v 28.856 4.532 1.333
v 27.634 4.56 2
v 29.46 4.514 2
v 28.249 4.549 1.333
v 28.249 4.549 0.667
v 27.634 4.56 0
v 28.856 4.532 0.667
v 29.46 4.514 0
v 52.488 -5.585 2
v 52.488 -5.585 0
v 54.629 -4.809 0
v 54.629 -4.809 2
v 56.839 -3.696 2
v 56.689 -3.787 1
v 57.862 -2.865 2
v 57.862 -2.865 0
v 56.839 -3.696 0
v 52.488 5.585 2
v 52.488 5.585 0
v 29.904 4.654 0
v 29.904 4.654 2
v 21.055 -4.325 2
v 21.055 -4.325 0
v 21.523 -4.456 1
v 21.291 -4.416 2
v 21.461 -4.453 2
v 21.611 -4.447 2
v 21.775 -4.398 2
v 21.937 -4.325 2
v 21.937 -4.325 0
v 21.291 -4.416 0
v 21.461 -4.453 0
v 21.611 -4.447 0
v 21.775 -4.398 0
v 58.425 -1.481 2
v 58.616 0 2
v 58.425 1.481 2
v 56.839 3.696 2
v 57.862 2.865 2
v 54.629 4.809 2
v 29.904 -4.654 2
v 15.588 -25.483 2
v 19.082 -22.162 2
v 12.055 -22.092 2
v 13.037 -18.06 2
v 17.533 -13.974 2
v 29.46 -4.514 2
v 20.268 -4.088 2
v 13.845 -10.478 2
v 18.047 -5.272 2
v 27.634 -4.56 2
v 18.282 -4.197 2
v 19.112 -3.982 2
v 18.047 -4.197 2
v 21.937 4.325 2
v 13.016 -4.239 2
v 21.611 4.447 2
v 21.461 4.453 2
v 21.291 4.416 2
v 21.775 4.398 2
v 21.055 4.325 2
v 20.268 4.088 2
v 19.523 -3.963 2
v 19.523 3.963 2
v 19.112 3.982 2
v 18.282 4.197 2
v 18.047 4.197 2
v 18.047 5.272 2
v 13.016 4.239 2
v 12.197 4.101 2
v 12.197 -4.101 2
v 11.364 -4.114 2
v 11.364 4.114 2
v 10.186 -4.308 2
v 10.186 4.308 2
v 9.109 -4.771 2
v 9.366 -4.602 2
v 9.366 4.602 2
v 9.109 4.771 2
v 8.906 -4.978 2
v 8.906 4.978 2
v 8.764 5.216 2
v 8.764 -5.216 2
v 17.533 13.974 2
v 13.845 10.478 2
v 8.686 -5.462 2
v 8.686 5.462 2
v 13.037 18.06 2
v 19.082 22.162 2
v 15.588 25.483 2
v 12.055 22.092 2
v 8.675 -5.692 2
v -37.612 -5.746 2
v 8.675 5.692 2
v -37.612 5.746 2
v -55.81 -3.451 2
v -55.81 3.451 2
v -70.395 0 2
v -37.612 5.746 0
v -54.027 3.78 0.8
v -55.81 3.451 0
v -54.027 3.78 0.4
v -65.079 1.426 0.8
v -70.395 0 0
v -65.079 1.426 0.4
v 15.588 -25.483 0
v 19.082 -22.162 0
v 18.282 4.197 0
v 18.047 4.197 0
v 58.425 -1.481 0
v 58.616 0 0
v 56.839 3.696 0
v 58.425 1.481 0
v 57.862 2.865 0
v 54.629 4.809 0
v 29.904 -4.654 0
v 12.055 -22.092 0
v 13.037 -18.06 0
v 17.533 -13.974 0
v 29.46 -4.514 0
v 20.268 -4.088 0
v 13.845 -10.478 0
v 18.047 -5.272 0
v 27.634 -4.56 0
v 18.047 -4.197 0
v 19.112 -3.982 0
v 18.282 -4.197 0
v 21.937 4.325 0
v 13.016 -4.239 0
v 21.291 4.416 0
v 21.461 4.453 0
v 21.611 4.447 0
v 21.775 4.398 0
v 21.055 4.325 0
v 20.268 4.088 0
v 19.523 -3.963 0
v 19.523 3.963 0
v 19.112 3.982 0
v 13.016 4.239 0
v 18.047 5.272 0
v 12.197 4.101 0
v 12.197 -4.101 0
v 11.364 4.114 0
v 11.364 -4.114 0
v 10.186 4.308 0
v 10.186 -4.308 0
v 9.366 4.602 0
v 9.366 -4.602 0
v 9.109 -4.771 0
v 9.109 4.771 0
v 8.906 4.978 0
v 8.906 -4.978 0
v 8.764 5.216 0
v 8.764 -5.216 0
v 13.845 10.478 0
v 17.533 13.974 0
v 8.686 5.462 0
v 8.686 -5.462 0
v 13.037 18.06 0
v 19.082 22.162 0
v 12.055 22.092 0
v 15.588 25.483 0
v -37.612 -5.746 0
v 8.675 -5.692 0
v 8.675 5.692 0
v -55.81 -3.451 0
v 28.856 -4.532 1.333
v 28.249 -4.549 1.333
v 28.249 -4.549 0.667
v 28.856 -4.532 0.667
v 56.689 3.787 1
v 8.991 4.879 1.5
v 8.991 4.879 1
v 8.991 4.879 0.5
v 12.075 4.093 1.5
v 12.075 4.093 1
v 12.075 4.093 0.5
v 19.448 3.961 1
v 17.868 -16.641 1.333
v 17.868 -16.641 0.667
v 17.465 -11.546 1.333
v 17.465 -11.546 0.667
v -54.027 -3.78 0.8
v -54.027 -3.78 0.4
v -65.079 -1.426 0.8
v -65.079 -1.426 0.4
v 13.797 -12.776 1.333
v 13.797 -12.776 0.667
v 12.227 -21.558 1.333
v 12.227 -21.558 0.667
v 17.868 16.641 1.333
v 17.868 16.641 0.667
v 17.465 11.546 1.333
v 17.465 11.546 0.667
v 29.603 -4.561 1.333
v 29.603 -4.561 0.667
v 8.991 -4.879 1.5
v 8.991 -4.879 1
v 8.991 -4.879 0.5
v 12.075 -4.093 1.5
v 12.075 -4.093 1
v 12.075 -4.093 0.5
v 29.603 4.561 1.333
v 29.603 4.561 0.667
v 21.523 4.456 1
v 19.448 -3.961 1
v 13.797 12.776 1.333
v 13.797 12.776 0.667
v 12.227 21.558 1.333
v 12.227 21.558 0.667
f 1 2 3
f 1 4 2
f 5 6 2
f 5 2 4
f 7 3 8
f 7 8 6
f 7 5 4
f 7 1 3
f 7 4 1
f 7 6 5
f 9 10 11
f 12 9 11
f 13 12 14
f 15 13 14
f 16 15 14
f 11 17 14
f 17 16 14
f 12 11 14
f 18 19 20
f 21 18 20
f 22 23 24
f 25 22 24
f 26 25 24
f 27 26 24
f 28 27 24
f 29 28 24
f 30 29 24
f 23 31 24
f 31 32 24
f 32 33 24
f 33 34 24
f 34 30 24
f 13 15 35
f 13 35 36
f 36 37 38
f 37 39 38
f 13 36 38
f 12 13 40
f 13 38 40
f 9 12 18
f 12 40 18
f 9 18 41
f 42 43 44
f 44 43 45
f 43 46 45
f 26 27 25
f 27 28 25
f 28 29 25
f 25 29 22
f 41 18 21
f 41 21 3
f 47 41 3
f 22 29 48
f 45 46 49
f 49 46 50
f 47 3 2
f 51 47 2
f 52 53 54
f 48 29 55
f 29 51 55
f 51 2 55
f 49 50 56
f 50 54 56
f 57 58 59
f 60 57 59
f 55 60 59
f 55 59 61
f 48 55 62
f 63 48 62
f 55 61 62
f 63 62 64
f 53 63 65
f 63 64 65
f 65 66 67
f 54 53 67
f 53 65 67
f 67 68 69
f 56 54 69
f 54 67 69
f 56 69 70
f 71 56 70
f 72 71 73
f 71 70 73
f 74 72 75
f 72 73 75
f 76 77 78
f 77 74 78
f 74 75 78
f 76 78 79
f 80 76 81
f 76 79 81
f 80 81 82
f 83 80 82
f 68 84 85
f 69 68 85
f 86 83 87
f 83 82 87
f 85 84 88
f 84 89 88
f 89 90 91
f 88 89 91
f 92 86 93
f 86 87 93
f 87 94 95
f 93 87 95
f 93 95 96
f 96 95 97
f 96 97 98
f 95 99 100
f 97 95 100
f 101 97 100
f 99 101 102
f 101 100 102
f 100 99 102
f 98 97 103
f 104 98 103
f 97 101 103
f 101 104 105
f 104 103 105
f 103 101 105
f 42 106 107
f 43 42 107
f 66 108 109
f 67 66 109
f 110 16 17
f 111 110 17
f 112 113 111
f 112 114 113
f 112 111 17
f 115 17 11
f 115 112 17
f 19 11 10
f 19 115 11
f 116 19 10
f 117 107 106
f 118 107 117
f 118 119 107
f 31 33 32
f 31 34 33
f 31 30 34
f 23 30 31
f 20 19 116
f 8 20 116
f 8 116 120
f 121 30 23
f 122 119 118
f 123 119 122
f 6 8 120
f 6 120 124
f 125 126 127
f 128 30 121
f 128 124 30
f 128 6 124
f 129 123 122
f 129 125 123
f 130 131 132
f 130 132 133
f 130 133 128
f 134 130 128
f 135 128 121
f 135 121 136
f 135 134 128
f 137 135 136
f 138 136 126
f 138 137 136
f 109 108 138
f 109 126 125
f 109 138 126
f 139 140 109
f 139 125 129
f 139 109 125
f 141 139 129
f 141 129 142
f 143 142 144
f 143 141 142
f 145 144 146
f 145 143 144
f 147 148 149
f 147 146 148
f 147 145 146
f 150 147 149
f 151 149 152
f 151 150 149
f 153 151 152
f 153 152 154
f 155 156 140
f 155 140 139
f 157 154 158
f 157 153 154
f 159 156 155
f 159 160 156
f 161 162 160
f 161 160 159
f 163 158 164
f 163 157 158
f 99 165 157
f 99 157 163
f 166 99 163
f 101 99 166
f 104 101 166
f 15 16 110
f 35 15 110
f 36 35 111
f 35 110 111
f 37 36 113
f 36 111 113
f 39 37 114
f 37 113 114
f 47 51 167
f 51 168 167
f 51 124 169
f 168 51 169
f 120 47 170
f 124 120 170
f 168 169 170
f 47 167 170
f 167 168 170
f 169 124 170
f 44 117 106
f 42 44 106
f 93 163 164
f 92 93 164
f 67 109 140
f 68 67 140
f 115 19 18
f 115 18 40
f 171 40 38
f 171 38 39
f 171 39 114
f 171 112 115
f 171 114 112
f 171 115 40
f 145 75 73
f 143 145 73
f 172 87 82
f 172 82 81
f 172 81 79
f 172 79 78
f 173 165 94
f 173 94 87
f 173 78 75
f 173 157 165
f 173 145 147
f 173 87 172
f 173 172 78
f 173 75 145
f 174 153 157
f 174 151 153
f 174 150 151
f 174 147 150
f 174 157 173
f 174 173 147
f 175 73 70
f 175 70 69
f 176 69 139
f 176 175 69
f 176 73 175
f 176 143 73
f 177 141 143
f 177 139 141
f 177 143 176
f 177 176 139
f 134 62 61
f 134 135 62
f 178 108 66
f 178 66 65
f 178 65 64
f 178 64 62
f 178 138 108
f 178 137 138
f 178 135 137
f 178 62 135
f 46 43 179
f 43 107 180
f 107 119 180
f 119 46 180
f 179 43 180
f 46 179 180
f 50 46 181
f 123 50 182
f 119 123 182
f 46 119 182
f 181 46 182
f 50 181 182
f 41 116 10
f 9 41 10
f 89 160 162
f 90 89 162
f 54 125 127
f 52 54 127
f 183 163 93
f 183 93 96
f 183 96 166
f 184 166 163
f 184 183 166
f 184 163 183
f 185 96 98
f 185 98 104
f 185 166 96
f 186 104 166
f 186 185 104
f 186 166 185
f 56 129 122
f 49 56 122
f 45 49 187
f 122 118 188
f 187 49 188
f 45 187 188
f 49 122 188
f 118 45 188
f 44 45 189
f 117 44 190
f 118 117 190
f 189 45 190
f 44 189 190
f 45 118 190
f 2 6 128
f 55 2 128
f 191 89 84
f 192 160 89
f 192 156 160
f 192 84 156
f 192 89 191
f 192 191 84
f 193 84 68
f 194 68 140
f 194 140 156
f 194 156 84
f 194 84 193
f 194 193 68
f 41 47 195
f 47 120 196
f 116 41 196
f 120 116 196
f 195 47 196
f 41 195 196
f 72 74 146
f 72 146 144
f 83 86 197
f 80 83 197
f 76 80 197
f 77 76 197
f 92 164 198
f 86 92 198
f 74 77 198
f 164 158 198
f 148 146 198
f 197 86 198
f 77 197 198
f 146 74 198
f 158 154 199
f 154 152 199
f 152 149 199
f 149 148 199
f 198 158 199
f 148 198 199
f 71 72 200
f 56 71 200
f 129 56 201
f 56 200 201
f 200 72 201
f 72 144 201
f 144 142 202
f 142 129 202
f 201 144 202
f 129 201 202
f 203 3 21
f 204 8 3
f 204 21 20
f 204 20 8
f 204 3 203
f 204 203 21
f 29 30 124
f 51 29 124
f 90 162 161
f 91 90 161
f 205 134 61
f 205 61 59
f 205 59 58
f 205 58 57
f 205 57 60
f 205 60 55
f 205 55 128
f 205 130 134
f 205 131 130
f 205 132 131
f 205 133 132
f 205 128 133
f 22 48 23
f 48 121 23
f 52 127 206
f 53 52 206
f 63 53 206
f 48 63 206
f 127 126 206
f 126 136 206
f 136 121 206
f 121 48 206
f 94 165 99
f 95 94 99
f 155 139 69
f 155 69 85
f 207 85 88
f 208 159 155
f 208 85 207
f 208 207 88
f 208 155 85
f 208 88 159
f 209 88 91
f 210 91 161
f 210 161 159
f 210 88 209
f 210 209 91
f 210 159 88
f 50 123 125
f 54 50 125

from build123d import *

# Parameters (mm, degrees)
F1_DEPTH = 2


with BuildPart() as f1:
    # F0 (on Top) → F1 (new body)
    with BuildSketch(Plane.XY):
        with BuildLine():
            add(Edge.make_bspline(
                [(8.6748898029, 5.6916326284), (8.6487335954, 5.4451622036), (8.9050139712, 4.6956597308), (10.3461055042, 4.2046193666), (12.0542033217, 4.0215565005), (12.7291959786, 4.1737857422), (13.0162881687, 4.2385328561)],
                knots=[0.1411262008, 0.1411262008, 0.1411262008, 0.1411262008, 0.3215319836, 0.5569055766, 0.8115402483, 1, 1, 1, 1], degree=3))
            Line((8.6748898029, 5.6916326284), (-37.6118458807, 5.7461173274))
            add(Edge.make_bspline(
                [(-37.6118458807, 5.7461173274), (-40.5734612696, 5.5933859506), (-46.0074223206, 5.0041541834), (-53.904567956, 3.8883420379), (-60.4349233984, 2.5040791618), (-65.0644995905, 1.4725007887), (-68.5725675359, 0.5033486653), (-70.3945532441, 0)],
                knots=[0.3193249377, 0.3193249377, 0.3193249377, 0.3193249377, 0.4741629094, 0.6243096755, 0.7604296541, 0.8755743181, 1, 1, 1, 1], degree=3))
            add(Edge.make_bspline(
                [(-37.6118458807, -5.7461173274), (-40.5734612696, -5.5933859506), (-46.0074223206, -5.0041541834), (-53.904567956, -3.8883420379), (-60.4349233984, -2.5040791618), (-65.0644995905, -1.4725007887), (-68.5725675359, -0.5033486653), (-70.3945532441, 0)],
                knots=[0.3193249377, 0.3193249377, 0.3193249377, 0.3193249377, 0.4741629094, 0.6243096755, 0.7604296541, 0.8755743181, 1, 1, 1, 1], degree=3))
            Line((-37.6118458807, -5.7461173274), (8.6748898029, -5.6916326284))
            add(Edge.make_bspline(
                [(8.6748898029, -5.6916326284), (8.6487335954, -5.4451622036), (8.9050139712, -4.6956597308), (10.3461055042, -4.2046193666), (12.0542033217, -4.0215565005), (12.7291959786, -4.1737857422), (13.0162881687, -4.2385328561)],
                knots=[0.1411262008, 0.1411262008, 0.1411262008, 0.1411262008, 0.3215319836, 0.5569055766, 0.8115402483, 1, 1, 1, 1], degree=3))
            add(Edge.make_bspline(
                [(13.0162881687, -4.2385328561), (13.5212335751, -6.8386267952), (14.5412711945, -12.0910631935), (12.3149675559, -21.397985611), (12.0986721053, -21.9763078704), (12.0552927256, -22.0922939479)],
                knots=[0, 0, 0, 0, 0.4393662274, 0.887561457, 1, 1, 1, 1], degree=3))
            Line((12.0552927256, -22.0922939479), (15.5880060047, -25.4827160388))
            Line((15.5880060047, -25.4827160388), (19.0819334239, -22.1619550139))
            add(Edge.make_bspline(
                [(19.0819334239, -22.1619550139), (18.6267322874, -20.294252499), (17.7386984759, -16.6506258682), (17.2606082512, -11.5156236051), (17.7756044656, -7.4243914642), (18.0465597659, -5.2718687803)],
                knots=[0, 0, 0, 0, 0.3326029965, 0.6488619712, 1, 1, 1, 1], degree=3))
            Line((18.0465597659, -5.2718687803), (18.0465597659, -4.1968291625))
            Line((18.0465597659, -4.1968291625), (18.2820949703, -4.1968291625))
            add(Edge.make_bspline(
                [(18.2820949703, -4.1968291625), (18.6553641024, -4.0763285269), (19.4680558232, -3.8139712612), (20.4982628837, -4.1457607251), (21.0552960634, -4.3251593597)],
                knots=[0, 0, 0, 0, 0.4592997844, 1, 1, 1, 1], degree=3))
            add(Edge.make_bspline(
                [(21.0552960634, -4.3251593597), (21.2135892272, -4.39182334), (21.5216440654, -4.5215583278), (21.8009874785, -4.3894057062), (21.9367910177, -4.3251593597)],
                knots=[0, 0, 0, 0, 0.5138473549, 1, 1, 1, 1], degree=3))
            Line((21.9367910177, -4.3251593597), (27.6336535588, -4.5601242409))
            add(Edge.make_bspline(
                [(27.6336535588, -4.5601242409), (28.2535762385, -4.5515479471), (28.8568336912, -4.5327320205), (29.4600911438, -4.5139160939)],
                knots=[0.7364720785, 0.7364720785, 0.7364720785, 0.7364720785, 1, 1, 1, 1], degree=3))
            add(Edge.make_bspline(
                [(29.4600911438, -4.5139160939), (29.602363452, -4.5612346279), (29.7446357601, -4.6085531619), (29.9036486376, -4.6537493056)],
                knots=[0, 0, 0, 0, 0.1239808677, 0.1239808677, 0.1239808677, 0.1239808677], degree=3))
            Line((29.9036486376, -4.6537493056), (52.4882189929, -5.5852411315))
            add(Edge.make_bspline(
                [(52.4882189929, -5.5852411315), (53.3910924323, -5.3930971357), (56.8432596926, -3.8943500714), (57.5901163978, -3.1391917956), (57.8616410494, -2.8646490537)],
                knots=[0.1940769563, 0.1940769563, 0.1940769563, 0.1940769563, 0.7070013938, 1, 1, 1, 1], degree=3))
            ThreePointArc((57.8616410494, -2.8646490537), (58.6164496784, 0), (57.8616410494, 2.8646490537))
            add(Edge.make_bspline(
                [(52.4882189929, 5.5852411315), (53.3910924323, 5.3930971357), (56.8432596926, 3.8943500714), (57.5901163978, 3.1391917956), (57.8616410494, 2.8646490537)],
                knots=[0.1940769563, 0.1940769563, 0.1940769563, 0.1940769563, 0.7070013938, 1, 1, 1, 1], degree=3))
            Line((52.4882189929, 5.5852411315), (29.9036486376, 4.6537493056))
            add(Edge.make_bspline(
                [(29.4600911438, 4.5139160939), (29.602363452, 4.5612346279), (29.7446357601, 4.6085531619), (29.9036486376, 4.6537493056)],
                knots=[0, 0, 0, 0, 0.1239808677, 0.1239808677, 0.1239808677, 0.1239808677], degree=3))
            add(Edge.make_bspline(
                [(27.6336535588, 4.5601242409), (28.2535762385, 4.5515479471), (28.8568336912, 4.5327320205), (29.4600911438, 4.5139160939)],
                knots=[0.7364720785, 0.7364720785, 0.7364720785, 0.7364720785, 1, 1, 1, 1], degree=3))
            Line((27.6336535588, 4.5601242409), (21.9367910177, 4.3251593597))
            add(Edge.make_bspline(
                [(21.0552960634, 4.3251593597), (21.2135892272, 4.39182334), (21.5216440654, 4.5215583278), (21.8009874785, 4.3894057062), (21.9367910177, 4.3251593597)],
                knots=[0, 0, 0, 0, 0.5138473549, 1, 1, 1, 1], degree=3))
            add(Edge.make_bspline(
                [(18.2820949703, 4.1968291625), (18.6553641024, 4.0763285269), (19.4680558232, 3.8139712612), (20.4982628837, 4.1457607251), (21.0552960634, 4.3251593597)],
                knots=[0, 0, 0, 0, 0.4592997844, 1, 1, 1, 1], degree=3))
            Line((18.2820949703, 4.1968291625), (18.0465597659, 4.1968291625))
            Line((18.0465597659, 4.1968291625), (18.0465597659, 5.2718687803))
            add(Edge.make_bspline(
                [(19.0819334239, 22.1619550139), (18.6267322874, 20.294252499), (17.7386984759, 16.6506258682), (17.2606082512, 11.5156236051), (17.7756044656, 7.4243914642), (18.0465597659, 5.2718687803)],
                knots=[0, 0, 0, 0, 0.3326029965, 0.6488619712, 1, 1, 1, 1], degree=3))
            Line((19.0819334239, 22.1619550139), (15.5880060047, 25.4827160388))
            Line((15.5880060047, 25.4827160388), (12.0552927256, 22.0922939479))
            add(Edge.make_bspline(
                [(13.0162881687, 4.2385328561), (13.5212335751, 6.8386267952), (14.5412711945, 12.0910631935), (12.3149675559, 21.397985611), (12.0986721053, 21.9763078704), (12.0552927256, 22.0922939479)],
                knots=[0, 0, 0, 0, 0.4393662274, 0.887561457, 1, 1, 1, 1], degree=3))
        make_face()
    extrude(amount=F1_DEPTH)


solid = f1.part
